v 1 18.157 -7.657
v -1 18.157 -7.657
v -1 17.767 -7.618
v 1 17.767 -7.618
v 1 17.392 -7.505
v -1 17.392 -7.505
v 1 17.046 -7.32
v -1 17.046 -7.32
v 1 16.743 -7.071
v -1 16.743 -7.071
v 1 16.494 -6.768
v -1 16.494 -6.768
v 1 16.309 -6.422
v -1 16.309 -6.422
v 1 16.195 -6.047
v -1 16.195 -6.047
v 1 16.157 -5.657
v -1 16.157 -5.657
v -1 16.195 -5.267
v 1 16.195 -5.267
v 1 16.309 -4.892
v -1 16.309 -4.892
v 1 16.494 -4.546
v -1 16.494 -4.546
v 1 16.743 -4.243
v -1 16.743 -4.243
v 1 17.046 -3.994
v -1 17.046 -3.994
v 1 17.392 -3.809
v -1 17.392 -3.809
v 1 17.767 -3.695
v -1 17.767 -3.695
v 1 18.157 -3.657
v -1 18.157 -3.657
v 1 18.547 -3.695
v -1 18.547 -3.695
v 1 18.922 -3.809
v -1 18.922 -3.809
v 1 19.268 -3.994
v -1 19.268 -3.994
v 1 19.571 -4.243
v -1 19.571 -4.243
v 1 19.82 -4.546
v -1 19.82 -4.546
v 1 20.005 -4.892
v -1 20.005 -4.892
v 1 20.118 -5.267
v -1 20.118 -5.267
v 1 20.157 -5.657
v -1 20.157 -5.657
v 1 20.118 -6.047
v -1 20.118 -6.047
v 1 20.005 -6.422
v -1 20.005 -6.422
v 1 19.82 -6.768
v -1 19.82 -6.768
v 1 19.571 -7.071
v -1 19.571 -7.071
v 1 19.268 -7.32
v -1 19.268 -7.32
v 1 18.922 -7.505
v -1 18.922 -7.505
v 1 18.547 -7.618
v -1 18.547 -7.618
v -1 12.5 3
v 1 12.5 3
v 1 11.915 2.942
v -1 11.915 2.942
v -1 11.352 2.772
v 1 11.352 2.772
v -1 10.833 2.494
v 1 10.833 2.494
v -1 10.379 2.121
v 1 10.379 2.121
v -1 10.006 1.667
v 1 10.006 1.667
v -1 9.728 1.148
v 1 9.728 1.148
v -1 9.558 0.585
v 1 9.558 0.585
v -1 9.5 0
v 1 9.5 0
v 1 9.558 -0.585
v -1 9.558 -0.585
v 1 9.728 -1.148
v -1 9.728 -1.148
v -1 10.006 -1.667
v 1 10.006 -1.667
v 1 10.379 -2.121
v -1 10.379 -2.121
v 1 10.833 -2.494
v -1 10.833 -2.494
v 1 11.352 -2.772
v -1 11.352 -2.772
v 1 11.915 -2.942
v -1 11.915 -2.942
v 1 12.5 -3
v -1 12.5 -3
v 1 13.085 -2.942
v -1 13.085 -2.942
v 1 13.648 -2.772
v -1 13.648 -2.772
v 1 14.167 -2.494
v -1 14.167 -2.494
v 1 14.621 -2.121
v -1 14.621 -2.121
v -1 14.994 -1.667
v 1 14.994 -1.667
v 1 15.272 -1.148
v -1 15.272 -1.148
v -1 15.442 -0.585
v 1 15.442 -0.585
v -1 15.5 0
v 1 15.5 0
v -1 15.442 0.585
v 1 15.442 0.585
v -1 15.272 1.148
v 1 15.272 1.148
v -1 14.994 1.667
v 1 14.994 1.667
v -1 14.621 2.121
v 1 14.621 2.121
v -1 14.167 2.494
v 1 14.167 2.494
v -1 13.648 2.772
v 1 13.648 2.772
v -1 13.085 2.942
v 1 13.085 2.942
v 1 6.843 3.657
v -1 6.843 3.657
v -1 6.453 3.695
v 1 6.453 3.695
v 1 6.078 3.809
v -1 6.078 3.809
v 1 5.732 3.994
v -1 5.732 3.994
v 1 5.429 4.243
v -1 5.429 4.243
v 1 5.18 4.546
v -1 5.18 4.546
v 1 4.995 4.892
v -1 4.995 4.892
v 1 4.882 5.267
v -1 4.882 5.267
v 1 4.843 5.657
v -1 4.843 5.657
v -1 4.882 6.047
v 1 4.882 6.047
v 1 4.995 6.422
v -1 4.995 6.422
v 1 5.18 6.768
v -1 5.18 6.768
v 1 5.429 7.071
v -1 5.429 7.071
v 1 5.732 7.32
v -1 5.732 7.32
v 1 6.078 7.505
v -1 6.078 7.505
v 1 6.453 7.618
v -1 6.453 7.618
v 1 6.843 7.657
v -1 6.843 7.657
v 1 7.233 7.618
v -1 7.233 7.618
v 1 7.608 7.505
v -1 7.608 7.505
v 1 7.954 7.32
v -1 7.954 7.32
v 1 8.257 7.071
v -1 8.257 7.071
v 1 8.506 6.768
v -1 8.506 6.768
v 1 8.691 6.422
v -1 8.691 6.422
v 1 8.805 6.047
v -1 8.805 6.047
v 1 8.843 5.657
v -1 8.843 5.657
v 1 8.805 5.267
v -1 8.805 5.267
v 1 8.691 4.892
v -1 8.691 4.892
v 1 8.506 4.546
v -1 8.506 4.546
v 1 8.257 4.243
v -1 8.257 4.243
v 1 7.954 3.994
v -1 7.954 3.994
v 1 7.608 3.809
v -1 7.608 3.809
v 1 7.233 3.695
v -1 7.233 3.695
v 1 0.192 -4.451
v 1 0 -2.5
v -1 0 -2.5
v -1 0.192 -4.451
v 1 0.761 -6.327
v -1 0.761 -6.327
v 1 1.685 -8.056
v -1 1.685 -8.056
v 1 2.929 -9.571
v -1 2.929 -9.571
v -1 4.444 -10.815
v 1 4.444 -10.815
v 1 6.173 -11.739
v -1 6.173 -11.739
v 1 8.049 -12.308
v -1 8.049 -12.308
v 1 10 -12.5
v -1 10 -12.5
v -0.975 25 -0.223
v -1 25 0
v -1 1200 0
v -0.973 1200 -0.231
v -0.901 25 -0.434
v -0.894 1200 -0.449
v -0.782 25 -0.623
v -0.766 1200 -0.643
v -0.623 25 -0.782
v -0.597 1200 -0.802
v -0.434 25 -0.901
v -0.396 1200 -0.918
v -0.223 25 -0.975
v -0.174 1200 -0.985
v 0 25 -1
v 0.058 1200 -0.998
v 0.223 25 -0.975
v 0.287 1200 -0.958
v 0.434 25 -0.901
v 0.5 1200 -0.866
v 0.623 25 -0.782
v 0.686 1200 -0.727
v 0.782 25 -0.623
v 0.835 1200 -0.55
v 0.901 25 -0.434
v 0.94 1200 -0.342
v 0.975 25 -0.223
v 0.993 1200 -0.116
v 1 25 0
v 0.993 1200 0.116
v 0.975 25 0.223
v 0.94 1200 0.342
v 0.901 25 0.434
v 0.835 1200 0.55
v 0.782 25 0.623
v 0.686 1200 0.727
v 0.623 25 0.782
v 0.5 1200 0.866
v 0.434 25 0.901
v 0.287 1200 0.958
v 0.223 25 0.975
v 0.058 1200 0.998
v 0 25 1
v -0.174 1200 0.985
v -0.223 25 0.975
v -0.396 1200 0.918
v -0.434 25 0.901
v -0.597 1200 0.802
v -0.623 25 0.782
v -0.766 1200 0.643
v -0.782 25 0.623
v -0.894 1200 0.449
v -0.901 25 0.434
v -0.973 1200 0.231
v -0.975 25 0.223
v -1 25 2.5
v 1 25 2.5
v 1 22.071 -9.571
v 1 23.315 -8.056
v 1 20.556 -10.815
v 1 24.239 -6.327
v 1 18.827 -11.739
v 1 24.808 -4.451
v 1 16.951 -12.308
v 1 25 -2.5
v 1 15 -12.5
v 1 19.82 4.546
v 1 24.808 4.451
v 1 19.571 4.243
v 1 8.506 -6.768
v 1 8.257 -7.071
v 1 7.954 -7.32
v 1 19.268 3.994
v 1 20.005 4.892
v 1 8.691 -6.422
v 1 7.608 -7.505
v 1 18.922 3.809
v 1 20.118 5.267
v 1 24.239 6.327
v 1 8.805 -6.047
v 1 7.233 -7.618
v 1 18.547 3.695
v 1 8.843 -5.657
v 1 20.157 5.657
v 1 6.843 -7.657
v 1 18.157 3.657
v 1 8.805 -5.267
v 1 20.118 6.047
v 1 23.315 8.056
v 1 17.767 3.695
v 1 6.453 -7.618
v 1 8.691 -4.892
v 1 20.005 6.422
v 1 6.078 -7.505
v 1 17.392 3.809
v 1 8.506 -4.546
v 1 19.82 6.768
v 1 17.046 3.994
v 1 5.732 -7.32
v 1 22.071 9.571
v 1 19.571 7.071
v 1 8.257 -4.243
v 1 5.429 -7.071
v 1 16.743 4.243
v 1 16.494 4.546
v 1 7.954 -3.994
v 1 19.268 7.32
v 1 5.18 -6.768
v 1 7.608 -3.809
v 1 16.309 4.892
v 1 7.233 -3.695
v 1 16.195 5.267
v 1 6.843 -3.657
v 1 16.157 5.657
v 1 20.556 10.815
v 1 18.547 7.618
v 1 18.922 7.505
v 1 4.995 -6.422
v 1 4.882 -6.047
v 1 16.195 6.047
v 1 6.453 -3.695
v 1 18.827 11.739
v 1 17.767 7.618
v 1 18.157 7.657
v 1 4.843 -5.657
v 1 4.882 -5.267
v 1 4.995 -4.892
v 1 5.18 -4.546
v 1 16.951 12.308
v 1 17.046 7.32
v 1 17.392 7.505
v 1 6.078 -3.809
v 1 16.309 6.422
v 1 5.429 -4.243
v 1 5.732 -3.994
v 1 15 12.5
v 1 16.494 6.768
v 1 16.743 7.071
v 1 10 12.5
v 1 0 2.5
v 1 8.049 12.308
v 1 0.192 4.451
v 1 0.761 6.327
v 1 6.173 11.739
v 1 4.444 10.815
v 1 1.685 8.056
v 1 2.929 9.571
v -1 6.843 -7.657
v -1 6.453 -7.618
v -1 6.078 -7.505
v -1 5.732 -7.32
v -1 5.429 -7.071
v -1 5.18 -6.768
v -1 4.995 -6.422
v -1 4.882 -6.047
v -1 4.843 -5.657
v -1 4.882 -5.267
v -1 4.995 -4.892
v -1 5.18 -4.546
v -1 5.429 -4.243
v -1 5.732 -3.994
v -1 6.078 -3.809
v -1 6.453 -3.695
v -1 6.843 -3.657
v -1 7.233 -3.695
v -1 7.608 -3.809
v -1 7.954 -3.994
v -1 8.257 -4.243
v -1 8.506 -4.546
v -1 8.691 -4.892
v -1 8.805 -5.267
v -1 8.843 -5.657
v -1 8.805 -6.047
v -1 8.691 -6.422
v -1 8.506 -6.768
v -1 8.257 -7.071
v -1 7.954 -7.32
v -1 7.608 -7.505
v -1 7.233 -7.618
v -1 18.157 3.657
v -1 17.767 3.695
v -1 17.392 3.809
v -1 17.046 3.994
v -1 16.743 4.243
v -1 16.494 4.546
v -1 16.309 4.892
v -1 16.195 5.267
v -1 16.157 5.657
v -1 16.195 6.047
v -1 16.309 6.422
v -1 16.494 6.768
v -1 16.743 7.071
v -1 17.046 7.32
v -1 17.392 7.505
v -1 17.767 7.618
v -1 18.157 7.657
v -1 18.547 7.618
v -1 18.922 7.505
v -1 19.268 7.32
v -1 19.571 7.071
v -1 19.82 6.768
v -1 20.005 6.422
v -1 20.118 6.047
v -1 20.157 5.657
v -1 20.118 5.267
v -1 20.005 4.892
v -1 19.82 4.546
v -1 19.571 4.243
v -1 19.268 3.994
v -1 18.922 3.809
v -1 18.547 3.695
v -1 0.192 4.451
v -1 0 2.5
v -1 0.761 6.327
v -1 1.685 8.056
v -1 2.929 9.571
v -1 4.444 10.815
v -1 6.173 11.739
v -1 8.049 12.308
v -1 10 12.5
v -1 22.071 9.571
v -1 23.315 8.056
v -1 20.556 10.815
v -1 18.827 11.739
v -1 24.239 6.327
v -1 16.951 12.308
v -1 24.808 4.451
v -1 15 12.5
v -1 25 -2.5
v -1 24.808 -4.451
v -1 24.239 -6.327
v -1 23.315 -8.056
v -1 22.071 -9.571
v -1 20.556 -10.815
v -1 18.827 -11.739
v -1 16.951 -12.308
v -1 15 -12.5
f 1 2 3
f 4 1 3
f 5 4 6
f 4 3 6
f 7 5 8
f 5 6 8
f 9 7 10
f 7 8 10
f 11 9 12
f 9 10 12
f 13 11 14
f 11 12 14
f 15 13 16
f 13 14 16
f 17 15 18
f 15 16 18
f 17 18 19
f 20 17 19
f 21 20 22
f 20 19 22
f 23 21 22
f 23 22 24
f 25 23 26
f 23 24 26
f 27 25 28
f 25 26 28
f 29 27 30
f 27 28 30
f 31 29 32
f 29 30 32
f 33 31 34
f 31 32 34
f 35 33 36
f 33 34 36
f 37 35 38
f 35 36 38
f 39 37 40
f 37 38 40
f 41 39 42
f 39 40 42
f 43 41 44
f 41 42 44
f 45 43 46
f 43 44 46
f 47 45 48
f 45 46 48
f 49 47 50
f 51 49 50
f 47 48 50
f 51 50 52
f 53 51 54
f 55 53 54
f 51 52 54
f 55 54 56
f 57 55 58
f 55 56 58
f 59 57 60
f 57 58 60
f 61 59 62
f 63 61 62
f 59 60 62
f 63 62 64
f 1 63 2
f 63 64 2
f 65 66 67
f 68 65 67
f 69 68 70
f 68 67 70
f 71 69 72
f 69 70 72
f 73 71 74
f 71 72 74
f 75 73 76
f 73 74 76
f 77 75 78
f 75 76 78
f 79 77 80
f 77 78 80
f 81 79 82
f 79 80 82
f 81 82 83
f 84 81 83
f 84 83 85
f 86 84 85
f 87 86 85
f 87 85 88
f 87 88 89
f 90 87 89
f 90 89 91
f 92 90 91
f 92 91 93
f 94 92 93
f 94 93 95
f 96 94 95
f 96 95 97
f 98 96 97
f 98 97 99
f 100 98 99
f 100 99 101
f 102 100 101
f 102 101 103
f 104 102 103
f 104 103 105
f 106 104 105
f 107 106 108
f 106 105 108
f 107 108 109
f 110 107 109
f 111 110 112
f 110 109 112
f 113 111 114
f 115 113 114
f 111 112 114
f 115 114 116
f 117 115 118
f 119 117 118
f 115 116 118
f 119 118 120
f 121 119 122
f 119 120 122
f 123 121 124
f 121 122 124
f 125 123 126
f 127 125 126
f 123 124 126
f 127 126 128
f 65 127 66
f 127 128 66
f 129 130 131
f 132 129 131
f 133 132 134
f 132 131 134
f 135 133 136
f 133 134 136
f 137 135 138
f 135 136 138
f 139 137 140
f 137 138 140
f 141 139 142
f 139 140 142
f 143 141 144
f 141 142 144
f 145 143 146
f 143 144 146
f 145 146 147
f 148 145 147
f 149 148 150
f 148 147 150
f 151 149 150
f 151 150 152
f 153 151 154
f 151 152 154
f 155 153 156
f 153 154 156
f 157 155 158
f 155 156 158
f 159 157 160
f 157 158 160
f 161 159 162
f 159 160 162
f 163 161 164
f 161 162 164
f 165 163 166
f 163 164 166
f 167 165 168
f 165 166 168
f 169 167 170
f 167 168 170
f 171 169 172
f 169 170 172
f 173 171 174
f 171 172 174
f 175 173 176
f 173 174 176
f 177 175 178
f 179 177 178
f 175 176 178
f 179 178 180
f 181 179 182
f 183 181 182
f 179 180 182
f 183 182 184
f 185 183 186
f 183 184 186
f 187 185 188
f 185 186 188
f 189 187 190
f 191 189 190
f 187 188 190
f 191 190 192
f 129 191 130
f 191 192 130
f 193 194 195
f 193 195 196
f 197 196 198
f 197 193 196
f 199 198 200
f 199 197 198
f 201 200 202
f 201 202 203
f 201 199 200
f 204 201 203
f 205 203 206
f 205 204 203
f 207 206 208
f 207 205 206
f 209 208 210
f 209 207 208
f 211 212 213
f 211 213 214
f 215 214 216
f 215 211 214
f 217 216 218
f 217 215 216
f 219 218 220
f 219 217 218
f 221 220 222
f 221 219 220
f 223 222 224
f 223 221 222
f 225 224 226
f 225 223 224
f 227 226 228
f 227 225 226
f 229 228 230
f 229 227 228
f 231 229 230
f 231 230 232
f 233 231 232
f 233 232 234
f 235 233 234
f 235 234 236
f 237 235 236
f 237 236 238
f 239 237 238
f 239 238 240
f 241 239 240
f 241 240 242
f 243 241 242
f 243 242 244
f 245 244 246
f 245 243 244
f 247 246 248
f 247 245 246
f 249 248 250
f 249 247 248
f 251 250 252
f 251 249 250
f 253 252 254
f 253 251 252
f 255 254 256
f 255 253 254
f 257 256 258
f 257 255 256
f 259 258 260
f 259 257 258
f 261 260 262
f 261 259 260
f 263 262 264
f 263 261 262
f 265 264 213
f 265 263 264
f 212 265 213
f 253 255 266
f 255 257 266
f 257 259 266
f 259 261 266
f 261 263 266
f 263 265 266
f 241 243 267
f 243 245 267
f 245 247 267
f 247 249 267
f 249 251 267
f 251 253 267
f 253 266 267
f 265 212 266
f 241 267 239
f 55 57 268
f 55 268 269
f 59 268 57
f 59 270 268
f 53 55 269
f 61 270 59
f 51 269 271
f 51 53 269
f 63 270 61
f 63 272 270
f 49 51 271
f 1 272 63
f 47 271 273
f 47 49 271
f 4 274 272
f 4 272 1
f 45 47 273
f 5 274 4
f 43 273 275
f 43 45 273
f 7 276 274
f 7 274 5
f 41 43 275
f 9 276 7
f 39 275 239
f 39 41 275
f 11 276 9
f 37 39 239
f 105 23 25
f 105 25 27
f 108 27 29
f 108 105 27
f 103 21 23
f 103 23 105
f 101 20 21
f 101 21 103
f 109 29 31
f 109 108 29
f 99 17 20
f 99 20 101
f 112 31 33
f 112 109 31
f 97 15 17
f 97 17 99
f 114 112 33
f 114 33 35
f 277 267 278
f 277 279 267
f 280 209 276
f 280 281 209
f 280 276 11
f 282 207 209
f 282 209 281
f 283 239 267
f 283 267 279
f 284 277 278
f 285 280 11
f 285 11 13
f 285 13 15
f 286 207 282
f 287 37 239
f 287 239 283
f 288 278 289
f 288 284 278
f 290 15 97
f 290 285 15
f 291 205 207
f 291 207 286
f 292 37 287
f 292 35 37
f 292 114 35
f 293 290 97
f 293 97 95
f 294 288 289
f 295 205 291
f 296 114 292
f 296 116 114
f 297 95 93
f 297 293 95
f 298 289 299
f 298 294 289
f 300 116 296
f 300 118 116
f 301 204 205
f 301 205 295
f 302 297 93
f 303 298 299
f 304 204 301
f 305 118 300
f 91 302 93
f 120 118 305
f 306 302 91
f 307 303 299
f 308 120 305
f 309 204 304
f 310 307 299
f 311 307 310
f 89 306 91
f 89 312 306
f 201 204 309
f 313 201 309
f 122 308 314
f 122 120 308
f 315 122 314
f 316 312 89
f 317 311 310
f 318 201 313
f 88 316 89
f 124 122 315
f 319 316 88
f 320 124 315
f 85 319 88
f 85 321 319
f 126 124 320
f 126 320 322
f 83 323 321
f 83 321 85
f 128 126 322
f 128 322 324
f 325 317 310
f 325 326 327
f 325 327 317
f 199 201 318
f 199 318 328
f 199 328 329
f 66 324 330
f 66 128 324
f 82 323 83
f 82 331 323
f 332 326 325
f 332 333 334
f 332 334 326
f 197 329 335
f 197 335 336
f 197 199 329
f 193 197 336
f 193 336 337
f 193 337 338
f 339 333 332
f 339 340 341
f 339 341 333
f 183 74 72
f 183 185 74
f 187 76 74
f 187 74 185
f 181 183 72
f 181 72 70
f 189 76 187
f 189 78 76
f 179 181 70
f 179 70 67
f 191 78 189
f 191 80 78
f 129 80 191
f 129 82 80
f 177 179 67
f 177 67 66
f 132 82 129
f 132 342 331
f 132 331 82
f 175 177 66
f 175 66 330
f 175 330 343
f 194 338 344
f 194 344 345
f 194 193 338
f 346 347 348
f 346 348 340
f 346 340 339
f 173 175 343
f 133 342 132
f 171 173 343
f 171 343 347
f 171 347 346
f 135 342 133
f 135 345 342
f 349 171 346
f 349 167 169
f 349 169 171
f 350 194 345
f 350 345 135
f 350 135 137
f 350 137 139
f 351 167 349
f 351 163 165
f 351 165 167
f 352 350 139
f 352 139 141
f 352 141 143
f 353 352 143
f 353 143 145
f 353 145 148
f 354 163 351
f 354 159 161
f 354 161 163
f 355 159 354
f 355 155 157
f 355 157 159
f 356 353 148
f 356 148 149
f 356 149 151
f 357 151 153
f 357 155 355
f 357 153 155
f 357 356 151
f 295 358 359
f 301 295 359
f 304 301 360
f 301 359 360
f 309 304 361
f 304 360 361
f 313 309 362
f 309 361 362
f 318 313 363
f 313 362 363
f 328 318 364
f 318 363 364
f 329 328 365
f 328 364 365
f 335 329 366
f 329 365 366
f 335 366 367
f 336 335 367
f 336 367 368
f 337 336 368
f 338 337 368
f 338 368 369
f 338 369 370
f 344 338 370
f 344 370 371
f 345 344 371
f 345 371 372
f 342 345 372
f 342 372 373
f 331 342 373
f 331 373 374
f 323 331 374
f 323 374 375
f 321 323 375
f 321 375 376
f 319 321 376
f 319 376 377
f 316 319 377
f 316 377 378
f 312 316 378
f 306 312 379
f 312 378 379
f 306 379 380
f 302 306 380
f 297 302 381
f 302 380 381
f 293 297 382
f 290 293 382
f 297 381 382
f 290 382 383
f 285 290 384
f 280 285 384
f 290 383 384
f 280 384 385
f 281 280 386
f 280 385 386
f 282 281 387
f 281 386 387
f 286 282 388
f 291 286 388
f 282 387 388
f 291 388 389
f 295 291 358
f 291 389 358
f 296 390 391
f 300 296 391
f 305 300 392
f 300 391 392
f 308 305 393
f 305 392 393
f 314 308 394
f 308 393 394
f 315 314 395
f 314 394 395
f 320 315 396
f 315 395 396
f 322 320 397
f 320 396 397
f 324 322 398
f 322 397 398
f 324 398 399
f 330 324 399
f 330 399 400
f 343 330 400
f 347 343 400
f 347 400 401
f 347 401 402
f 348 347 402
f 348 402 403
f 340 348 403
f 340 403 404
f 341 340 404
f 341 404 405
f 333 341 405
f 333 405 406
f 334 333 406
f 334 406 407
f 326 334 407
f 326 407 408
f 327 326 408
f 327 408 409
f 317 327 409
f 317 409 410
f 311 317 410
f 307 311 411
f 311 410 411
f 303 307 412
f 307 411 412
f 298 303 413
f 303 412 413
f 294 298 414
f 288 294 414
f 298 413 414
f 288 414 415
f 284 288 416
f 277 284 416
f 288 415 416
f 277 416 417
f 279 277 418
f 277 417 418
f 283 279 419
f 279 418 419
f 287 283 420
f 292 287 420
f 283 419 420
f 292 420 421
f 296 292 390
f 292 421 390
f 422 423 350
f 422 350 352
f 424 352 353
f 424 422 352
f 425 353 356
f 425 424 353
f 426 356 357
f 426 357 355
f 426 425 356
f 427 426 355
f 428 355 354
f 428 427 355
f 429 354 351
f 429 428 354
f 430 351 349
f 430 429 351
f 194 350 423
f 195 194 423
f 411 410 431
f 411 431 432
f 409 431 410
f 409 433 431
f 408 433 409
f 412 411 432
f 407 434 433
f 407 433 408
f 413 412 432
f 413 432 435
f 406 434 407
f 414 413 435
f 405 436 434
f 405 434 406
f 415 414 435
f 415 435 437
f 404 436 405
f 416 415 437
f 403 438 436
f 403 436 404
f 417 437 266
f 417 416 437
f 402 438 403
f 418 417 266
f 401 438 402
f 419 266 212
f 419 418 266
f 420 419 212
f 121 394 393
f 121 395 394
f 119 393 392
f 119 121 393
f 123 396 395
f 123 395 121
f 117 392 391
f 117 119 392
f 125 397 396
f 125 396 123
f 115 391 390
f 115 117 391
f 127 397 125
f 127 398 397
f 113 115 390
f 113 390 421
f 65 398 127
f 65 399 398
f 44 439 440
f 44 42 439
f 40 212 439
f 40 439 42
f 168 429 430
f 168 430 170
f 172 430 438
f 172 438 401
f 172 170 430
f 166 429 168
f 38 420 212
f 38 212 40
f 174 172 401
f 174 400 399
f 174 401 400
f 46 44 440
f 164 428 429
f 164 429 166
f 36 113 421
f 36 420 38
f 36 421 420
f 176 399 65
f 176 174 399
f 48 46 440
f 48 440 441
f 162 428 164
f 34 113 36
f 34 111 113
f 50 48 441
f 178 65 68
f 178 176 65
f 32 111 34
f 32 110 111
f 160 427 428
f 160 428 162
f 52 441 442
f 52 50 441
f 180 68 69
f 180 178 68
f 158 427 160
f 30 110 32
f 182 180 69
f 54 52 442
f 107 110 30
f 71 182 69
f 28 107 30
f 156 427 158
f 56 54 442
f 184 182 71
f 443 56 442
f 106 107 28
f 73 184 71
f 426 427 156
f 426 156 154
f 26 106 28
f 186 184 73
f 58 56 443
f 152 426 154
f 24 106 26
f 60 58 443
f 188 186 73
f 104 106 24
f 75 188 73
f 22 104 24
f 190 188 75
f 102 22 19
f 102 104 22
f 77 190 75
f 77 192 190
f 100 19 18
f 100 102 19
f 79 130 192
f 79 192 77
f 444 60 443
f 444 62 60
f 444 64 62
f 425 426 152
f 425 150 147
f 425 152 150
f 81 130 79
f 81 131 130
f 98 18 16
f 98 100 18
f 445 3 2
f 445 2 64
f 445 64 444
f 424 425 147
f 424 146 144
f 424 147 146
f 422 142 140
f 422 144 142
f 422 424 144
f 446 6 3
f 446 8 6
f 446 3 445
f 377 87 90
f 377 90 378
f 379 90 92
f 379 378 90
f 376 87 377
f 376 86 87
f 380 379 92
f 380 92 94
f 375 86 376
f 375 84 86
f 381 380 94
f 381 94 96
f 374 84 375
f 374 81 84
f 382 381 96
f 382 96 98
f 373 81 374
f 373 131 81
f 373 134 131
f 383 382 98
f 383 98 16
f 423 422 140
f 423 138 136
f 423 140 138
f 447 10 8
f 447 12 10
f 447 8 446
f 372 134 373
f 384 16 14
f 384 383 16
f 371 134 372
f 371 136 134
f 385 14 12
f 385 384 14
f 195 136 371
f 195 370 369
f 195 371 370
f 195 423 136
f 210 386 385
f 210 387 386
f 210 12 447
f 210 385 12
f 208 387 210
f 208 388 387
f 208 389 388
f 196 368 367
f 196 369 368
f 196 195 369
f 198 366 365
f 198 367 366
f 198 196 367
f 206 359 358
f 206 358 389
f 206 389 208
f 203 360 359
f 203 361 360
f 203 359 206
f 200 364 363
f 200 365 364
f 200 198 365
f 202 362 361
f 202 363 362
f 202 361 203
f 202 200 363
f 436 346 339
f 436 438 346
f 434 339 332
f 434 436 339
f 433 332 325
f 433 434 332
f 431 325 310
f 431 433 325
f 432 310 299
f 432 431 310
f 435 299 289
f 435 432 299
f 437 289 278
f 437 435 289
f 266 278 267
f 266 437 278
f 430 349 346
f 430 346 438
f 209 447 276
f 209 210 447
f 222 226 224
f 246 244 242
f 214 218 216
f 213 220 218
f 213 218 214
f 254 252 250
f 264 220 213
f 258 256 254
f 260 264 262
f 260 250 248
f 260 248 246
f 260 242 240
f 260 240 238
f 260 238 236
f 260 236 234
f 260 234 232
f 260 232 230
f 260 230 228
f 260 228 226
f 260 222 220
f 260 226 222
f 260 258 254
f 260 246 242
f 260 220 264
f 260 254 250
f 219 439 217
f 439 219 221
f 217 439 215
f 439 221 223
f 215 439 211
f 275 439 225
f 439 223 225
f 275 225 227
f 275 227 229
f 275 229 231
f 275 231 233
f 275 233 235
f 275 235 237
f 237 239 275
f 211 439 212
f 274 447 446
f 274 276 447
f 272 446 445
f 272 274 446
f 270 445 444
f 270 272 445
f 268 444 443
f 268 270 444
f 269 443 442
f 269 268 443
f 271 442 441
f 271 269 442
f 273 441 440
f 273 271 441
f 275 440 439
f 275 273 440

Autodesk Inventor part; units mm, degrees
ref_plane "YZ Plane" through (0, 0, 0) normal (1, 0, 0) x (0, 1, 0)
ref_plane "XZ Plane" through (0, 0, 0) normal (0, 1, 0) x (-1, 0, 0)
ref_plane "XY Plane" through (0, 0, 0) normal (0, 0, 1) x (1, 0, 0)
sketch "Sketch1" plane through (0, 0, 0) normal (0, 1, 0) x (-1, 0, 0)
  circle A0 centre (0, 0) radius 1
  dimension "d0" = 2
extrude "Extrusion1" add sketch "Sketch1" along normal blind 1200
sketch "Sketch2" plane through (0, 0, 0) normal (0, -1, 0) x (1, 0, 0)
  line L0 (-1, -12.5) -> (1, -12.5)
  line L1 (1, -12.5) -> (1, 12.5)
  line L2 (1, 12.5) -> (-1, 12.5)
  line L3 (-1, 12.5) -> (-1, -12.5)
  line L4 (-1, -12.5) -> (1, 12.5) construction
  line L5 (1, -12.5) -> (-1, 12.5) construction
  point P0 (0, 0)
  dimension "d3" = 2
  dimension "d4" = 25
extrude "Extrusion2" add sketch "Sketch2" against normal blind 25
fillet "Fillet1" radius 10 4 edges at (0, 25, 12.5) (0, 25, -12.5) (0, 0, 12.5) (0, 0, -12.5)
sketch "Sketch3" plane through (-1, 0, -2.5) normal (-1, 0, 0) x (0, 0, 1)
  circle A0 centre (2.5, 12.5) radius 3
  point P0 (2.5, 0)
  dimension "d8" = 6
hole "Hole1" at (-1, 12.5, 0) direction (1, 0, 0) diameter 6 end through all
sketch "Sketch4" plane through (1, 0, 2.5) normal (1, 0, 0) x (0, 0, -1)
  circle A0 centre (8.1569, 18.1569) radius 1.8 projected
  circle A1 centre (8.1569, 6.8431) radius 1.8 projected
  circle A2 centre (-3.1569, 6.8431) radius 1.8 projected
  circle A3 centre (-3.1569, 18.1569) radius 1.8 projected
  point P0 (2.5, 0)
hole "Hole2" at (1, 18.1569, -5.6569) at (1, 6.8431, -5.6569) at (1, 6.8431, 5.6569) at (1, 18.1569, 5.6569) direction (-1, 0, 0) diameter 4 end through all
properties part number "Hook Whip"
